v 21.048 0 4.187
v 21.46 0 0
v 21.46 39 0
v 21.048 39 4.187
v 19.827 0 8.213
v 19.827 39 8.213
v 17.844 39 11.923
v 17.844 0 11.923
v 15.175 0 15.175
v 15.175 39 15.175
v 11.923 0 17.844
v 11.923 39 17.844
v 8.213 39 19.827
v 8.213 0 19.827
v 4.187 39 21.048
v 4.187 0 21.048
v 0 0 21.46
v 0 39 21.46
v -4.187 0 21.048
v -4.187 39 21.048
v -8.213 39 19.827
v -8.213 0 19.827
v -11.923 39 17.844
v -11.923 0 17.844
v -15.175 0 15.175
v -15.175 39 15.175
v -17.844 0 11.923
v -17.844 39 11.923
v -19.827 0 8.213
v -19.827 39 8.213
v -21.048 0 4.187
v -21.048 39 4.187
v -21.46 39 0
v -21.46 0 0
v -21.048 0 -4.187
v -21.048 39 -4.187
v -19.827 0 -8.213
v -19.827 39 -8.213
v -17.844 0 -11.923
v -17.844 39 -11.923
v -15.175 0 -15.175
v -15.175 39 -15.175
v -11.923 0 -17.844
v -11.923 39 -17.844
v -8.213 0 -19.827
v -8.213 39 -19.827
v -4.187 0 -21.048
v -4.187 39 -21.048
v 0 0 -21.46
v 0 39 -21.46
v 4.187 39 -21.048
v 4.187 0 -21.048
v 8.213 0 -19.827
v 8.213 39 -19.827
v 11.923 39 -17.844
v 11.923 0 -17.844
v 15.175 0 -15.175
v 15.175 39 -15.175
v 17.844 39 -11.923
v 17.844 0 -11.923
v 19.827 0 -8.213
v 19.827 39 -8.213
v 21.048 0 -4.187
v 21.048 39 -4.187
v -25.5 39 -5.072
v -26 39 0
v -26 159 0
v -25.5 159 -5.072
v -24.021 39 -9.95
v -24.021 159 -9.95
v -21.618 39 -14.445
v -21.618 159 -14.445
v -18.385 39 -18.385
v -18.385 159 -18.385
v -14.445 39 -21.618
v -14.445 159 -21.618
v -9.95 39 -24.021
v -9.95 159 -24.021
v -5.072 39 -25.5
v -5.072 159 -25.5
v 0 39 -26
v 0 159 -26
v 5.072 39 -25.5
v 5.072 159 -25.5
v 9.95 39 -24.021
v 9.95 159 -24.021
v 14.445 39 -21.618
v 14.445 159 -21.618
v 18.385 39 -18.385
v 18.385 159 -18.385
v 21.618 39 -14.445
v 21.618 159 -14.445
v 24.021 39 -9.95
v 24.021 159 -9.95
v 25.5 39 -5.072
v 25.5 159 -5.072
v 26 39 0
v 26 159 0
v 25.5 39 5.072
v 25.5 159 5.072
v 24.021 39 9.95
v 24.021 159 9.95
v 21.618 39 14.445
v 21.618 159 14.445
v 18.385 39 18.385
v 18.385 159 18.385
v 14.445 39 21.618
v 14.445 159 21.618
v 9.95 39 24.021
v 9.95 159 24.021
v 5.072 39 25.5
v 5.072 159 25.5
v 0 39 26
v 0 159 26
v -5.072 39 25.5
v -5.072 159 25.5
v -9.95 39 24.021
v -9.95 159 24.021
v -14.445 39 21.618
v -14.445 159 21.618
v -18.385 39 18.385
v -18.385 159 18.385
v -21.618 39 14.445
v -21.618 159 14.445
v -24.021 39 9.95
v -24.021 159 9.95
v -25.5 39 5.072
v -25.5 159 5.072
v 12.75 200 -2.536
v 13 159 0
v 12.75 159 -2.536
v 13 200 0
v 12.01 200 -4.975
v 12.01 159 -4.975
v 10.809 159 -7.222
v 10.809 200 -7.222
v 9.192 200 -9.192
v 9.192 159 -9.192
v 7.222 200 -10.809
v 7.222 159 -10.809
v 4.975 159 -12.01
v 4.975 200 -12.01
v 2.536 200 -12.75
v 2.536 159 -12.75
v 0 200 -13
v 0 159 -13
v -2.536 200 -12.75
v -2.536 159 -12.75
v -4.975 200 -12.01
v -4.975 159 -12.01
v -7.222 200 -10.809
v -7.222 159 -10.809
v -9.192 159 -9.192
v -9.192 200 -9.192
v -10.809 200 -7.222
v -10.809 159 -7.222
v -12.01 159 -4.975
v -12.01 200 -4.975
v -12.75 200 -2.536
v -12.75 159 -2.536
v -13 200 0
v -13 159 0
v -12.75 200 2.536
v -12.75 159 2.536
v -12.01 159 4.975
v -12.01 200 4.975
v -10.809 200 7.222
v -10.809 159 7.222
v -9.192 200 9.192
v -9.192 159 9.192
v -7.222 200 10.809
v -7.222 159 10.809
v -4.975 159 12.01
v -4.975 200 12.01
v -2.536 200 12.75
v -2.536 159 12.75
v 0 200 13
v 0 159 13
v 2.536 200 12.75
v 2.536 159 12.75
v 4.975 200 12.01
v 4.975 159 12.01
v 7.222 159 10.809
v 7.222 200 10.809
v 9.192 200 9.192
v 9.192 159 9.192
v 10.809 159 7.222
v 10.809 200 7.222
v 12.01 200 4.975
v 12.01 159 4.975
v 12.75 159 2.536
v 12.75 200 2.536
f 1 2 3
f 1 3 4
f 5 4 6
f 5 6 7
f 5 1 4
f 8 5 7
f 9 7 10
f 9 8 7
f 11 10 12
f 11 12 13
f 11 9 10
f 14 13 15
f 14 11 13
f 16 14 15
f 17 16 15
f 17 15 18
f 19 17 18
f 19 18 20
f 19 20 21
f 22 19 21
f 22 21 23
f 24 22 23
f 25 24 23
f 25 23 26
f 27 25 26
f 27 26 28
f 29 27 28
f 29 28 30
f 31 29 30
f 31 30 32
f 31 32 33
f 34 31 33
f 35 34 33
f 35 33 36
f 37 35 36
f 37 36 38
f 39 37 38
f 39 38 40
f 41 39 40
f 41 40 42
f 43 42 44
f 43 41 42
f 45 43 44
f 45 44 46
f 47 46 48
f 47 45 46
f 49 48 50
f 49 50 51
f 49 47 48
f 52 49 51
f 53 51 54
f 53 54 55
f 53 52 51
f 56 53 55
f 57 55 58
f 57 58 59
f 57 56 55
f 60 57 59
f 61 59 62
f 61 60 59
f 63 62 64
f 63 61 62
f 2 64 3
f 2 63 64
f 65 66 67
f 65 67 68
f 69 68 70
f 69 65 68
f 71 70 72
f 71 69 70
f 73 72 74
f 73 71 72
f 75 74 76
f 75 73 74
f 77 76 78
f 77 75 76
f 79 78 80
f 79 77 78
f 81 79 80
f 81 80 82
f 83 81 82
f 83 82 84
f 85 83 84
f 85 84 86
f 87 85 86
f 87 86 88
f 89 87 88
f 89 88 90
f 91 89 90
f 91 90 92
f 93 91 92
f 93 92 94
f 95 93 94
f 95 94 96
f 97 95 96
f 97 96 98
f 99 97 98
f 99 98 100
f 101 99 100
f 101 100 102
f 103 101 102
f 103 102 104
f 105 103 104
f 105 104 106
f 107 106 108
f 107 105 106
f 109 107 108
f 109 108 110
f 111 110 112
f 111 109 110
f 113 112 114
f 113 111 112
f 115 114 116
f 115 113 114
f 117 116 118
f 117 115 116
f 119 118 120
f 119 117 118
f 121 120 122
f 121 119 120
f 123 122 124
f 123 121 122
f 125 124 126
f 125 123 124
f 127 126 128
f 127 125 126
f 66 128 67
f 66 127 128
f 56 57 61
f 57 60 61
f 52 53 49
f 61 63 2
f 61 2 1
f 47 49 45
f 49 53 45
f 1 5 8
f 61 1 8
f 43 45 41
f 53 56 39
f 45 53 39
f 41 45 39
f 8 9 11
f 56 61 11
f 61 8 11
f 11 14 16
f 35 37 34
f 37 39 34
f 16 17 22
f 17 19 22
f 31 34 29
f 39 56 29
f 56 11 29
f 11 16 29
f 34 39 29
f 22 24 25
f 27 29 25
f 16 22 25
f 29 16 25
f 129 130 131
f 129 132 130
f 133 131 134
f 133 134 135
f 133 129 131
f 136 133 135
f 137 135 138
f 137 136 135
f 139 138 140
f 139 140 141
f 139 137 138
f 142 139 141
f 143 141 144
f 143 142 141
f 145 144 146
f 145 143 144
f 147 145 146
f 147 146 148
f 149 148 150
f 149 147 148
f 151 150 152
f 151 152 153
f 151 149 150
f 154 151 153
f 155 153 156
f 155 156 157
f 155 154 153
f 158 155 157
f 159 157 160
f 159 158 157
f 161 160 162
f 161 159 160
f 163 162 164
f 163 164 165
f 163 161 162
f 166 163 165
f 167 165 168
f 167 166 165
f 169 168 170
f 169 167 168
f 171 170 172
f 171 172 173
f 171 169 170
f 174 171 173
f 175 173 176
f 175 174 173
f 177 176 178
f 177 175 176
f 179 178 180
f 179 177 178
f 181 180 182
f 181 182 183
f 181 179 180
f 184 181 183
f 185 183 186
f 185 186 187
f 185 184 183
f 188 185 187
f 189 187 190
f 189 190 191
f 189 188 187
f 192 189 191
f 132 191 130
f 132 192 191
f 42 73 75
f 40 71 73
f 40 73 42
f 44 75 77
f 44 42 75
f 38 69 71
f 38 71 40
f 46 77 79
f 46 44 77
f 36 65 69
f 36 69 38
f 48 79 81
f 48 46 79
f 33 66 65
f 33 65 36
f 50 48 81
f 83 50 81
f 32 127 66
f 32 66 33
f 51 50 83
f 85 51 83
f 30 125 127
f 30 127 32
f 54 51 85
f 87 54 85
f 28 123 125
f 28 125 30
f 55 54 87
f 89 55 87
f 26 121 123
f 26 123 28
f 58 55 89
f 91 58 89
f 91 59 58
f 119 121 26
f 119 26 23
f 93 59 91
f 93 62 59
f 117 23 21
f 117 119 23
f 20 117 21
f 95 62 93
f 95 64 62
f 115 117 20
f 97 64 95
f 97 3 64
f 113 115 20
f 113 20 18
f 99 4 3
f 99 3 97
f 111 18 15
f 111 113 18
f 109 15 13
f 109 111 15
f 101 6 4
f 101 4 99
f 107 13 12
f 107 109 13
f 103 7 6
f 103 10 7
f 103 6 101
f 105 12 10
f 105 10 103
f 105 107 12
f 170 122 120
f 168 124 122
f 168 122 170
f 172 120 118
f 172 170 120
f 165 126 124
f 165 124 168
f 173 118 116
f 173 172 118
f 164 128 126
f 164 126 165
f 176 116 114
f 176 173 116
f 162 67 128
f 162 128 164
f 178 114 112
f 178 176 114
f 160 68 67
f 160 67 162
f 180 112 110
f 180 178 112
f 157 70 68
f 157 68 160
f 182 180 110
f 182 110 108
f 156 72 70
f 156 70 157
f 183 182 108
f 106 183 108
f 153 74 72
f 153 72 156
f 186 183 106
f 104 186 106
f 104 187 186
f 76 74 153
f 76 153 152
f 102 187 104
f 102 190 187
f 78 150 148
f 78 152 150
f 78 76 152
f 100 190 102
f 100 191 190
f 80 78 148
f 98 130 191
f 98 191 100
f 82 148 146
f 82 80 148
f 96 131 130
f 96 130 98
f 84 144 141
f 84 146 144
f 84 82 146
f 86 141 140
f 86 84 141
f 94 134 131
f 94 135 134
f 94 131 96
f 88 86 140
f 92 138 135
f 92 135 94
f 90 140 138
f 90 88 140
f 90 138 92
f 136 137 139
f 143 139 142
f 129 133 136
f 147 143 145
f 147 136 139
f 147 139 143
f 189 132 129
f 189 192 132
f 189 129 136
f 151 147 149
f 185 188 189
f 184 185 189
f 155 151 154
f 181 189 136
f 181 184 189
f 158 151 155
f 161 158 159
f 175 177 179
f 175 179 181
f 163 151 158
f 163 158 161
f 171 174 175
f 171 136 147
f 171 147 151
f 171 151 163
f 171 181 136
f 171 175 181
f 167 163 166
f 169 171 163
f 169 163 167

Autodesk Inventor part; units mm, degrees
ref_plane "YZ Plane" through (0, 0, 0) normal (1, 0, 0) x (0, 1, 0)
ref_plane "XZ Plane" through (0, 0, 0) normal (0, 1, 0) x (-1, 0, 0)
ref_plane "XY Plane" through (0, 0, 0) normal (0, 0, 1) x (1, 0, 0)
sketch "Sketch1" plane through (0, 0, 0) normal (0, 1, 0) x (-1, 0, 0)
  circle A0 centre (0, 0) radius 26
  dimension "d0" = 52
extrude "Extrusion1" add sketch "Sketch1" along normal blind 200
sketch "Sketch2" plane through (0, 200, 0) normal (0, 1, 0) x (1, 0, 0)
  circle A0 centre (0, 0) radius 26 projected
  circle A1 centre (0, 0) radius 13
  dimension "d3" = 26
extrude "Extrusion2" cut sketch "Sketch2" against normal blind 41
sketch "Sketch3" plane through (0, 0, 0) normal (0, -1, 0) x (1, 0, 0)
  circle A0 centre (0, 0) radius 13 projected
  circle A1 centre (0, 0) radius 21.4603
  circle A2 centre (0, 0) radius 26 projected
extrude "Extrusion3" cut sketch "Sketch3" against normal blind 39 contours A2
properties part number "spindleStandin"
